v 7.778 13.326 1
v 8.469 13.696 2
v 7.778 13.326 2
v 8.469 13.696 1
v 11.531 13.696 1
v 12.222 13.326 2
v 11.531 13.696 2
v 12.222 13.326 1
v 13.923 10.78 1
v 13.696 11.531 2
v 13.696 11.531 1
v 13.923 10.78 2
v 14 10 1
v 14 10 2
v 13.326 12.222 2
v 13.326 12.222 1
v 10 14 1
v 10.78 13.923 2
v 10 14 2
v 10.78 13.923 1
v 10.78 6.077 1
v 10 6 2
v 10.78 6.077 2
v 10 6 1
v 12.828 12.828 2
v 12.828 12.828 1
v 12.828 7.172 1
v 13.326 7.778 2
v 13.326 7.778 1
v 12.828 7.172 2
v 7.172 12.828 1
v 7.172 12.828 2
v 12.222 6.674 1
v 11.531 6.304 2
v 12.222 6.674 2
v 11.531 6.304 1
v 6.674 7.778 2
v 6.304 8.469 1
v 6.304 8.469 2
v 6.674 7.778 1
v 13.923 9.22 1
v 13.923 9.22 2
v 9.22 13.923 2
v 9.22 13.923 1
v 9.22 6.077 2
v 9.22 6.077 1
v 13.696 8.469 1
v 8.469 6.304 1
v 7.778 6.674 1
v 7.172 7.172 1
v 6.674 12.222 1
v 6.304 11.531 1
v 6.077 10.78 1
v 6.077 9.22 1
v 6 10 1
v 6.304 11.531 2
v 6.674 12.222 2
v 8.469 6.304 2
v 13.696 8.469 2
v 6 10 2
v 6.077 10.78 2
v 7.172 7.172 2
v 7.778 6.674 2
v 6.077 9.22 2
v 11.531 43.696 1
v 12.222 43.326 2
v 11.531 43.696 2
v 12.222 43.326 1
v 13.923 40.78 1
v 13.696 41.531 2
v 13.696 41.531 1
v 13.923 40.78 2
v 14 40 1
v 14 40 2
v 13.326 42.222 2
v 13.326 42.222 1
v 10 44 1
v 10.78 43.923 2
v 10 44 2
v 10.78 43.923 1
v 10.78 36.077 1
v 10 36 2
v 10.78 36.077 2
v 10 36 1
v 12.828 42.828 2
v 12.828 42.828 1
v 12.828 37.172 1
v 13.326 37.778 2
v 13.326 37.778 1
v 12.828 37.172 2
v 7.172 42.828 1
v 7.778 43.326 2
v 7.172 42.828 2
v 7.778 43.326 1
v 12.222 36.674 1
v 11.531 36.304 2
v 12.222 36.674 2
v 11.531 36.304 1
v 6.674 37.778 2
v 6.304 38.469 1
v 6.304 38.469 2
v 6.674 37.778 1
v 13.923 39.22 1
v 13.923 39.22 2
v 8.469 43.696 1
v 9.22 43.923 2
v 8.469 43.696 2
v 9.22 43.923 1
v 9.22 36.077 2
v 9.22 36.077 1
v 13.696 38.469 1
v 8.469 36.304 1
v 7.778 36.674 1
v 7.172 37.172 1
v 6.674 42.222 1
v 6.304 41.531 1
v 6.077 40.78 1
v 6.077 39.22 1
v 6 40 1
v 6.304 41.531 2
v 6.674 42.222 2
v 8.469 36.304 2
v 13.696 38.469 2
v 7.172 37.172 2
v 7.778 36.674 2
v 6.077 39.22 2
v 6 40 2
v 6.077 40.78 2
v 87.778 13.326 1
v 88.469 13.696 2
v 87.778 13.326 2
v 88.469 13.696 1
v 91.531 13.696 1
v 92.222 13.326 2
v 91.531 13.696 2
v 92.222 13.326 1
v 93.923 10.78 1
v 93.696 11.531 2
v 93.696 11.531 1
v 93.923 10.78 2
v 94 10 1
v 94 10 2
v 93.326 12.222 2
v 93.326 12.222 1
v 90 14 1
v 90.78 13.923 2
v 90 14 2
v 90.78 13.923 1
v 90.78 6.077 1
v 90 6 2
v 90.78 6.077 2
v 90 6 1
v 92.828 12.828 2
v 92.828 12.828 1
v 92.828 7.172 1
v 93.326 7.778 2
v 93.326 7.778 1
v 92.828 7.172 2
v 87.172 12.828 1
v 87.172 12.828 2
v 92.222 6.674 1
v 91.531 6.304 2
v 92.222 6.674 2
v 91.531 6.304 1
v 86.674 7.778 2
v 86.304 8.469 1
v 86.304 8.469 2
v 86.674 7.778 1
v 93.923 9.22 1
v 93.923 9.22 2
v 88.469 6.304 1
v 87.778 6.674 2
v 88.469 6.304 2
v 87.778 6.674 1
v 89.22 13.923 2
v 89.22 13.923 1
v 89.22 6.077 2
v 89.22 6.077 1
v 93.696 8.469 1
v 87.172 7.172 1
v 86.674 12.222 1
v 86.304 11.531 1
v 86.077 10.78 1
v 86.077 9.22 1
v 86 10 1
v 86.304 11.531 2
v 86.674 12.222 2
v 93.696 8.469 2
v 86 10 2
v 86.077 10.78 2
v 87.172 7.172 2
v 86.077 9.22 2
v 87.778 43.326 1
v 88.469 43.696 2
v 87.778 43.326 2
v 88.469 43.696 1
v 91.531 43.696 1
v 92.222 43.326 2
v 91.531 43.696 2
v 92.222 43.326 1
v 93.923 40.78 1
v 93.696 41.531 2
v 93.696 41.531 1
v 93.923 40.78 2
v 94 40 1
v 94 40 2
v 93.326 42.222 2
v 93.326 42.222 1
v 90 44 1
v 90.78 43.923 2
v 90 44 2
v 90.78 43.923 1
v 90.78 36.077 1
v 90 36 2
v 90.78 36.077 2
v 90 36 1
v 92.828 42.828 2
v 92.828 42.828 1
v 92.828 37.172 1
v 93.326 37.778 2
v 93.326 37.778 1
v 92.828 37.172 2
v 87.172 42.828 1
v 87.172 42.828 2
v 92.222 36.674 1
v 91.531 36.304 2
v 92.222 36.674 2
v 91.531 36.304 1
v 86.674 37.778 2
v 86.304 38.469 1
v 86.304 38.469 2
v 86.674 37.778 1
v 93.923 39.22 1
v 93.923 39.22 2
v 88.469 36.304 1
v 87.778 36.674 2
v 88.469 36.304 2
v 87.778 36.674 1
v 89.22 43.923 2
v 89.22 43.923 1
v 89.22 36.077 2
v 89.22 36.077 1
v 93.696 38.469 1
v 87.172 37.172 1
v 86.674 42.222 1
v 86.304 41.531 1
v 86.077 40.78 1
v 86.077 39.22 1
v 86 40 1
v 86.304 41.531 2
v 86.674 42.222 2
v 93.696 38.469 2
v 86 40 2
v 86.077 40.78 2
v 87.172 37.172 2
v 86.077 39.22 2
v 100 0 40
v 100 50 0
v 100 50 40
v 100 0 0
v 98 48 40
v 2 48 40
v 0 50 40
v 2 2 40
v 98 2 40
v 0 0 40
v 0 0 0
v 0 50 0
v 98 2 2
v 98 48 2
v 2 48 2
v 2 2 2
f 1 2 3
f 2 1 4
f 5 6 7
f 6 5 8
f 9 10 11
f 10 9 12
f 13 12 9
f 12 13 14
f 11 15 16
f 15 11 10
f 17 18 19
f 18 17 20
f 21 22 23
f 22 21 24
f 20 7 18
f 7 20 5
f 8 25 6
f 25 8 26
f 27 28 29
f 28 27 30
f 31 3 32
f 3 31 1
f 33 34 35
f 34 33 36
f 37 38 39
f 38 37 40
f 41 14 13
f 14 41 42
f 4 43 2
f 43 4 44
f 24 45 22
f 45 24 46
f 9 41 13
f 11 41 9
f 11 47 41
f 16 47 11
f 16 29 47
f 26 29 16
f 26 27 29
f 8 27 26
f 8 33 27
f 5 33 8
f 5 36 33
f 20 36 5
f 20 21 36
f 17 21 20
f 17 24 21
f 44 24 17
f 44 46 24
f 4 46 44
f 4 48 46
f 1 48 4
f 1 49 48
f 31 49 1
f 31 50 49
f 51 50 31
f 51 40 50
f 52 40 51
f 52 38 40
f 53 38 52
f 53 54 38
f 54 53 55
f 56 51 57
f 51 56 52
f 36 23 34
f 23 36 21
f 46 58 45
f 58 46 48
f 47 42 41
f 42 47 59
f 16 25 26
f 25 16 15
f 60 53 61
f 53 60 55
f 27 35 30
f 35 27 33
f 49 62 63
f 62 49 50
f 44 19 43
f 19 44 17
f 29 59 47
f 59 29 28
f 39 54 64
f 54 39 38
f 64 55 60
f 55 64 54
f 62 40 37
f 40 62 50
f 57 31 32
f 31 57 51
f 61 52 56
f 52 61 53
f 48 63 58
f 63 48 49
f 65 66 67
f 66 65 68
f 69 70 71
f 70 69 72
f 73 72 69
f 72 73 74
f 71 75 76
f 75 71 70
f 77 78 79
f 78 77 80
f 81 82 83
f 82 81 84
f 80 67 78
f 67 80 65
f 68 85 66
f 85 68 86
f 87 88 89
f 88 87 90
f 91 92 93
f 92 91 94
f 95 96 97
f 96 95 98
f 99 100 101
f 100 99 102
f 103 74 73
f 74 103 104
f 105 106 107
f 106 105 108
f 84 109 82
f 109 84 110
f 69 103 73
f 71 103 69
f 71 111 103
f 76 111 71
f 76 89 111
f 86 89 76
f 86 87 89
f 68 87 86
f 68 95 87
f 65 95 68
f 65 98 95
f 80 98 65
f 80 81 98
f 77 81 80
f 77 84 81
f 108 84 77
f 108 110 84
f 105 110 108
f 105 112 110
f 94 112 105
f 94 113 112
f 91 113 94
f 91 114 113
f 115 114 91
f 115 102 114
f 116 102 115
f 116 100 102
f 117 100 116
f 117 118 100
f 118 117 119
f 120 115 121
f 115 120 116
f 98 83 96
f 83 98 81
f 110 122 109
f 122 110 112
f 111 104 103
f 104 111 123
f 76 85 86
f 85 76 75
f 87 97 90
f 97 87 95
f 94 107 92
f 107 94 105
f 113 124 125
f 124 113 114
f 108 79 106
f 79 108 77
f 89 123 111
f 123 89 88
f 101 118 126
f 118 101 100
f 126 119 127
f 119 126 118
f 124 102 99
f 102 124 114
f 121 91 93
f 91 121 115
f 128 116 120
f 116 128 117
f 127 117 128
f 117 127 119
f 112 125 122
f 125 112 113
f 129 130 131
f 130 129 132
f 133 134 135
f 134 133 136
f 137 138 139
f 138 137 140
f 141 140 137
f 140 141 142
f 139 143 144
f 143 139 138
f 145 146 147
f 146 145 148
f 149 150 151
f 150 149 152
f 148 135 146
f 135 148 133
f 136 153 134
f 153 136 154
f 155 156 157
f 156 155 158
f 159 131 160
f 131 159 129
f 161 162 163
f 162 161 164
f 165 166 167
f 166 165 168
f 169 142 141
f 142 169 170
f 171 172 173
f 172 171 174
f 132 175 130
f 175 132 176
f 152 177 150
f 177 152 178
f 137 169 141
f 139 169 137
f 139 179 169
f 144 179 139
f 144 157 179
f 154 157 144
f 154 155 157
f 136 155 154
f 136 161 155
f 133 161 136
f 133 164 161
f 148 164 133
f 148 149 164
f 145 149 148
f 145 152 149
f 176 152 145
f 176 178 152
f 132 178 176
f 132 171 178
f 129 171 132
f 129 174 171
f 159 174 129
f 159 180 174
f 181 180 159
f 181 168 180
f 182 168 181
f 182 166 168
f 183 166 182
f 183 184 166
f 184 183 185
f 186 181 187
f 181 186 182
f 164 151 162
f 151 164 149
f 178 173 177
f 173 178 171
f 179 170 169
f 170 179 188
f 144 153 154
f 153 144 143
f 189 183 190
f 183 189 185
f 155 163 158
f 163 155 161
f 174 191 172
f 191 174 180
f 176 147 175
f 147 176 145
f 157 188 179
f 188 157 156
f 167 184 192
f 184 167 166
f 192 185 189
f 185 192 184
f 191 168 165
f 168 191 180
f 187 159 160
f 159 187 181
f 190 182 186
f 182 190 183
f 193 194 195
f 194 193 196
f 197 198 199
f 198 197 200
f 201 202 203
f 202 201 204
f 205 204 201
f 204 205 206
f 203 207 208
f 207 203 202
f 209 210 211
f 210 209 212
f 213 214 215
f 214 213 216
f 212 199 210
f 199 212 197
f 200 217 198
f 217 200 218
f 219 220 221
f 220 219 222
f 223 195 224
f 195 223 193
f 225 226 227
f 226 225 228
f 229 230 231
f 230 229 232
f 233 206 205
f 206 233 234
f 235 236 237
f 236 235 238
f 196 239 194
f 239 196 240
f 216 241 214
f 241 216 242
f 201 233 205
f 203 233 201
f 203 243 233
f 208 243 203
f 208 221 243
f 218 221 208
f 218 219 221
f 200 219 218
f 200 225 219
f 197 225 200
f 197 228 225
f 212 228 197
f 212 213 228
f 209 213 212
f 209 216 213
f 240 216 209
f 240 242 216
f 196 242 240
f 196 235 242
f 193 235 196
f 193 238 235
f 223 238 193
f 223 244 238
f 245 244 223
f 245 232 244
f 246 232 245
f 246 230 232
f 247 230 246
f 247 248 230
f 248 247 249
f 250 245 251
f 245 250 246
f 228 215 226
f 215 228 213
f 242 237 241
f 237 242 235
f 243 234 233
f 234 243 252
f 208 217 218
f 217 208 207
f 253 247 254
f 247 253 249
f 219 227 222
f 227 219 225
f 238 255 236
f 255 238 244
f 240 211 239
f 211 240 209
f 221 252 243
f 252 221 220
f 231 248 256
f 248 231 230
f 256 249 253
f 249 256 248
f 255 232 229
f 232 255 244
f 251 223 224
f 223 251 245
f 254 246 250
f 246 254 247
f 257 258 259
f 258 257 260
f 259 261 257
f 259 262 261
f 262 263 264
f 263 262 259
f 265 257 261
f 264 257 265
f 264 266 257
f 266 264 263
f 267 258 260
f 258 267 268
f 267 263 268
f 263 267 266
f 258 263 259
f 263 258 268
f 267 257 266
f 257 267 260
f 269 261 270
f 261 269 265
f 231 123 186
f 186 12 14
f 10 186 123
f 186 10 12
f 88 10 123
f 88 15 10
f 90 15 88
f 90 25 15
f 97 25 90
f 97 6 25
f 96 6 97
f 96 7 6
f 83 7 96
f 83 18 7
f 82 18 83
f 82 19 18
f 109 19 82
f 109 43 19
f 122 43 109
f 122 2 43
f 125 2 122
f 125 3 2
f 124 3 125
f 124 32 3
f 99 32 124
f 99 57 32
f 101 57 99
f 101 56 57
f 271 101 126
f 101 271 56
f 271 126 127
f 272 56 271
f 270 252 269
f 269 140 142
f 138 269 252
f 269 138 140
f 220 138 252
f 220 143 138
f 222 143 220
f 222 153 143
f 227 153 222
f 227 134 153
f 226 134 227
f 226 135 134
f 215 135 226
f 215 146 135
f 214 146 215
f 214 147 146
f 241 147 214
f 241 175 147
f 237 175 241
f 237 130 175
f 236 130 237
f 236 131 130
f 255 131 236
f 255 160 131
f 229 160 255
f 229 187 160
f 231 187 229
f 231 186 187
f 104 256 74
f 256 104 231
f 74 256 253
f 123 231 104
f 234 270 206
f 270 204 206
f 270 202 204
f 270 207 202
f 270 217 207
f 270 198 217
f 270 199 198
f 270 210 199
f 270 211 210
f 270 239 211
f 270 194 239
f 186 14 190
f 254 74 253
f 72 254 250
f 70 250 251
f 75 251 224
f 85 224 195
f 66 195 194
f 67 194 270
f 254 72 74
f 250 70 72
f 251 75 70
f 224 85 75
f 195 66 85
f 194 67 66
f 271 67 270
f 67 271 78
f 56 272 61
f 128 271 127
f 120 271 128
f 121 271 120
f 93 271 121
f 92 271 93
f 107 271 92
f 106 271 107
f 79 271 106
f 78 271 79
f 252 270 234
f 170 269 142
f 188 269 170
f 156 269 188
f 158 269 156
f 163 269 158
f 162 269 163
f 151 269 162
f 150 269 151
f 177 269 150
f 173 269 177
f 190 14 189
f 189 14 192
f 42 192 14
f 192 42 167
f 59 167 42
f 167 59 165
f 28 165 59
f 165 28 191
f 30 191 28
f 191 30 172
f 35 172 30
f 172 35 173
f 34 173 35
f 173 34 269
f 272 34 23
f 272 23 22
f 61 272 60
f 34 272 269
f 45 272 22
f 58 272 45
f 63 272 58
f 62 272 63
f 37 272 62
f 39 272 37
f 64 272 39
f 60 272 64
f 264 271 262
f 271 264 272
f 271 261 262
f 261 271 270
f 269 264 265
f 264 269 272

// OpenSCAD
$fn = 32;

// ----------------------------------------------------------------------
// Enclosure box: bosses enclosure
// ----------------------------------------------------------------------

// --- parameters (mm) ---
box_l = 100;              // outer length, X
box_w = 50;               // outer width, Y
box_h = 40;               // outer height
wall_t = 2;               // wall thickness
boss_r = 4;               // corner boss radius
hole_r = 1.5;             // boss screw hole radius
boss_in = 10;             // boss inset from the corners

inner_h = box_h - wall_t;  // cavity depth
boss_h = inner_h - 2;  // corner boss height

difference() {
  cube([box_l, box_w, box_h]);
  translate([wall_t, wall_t, wall_t])
    cube([box_l - 2 * wall_t, box_w - 2 * wall_t, box_h]);
  for (sx = [0, 1], sy = [0, 1])
    translate([sx ? box_l - boss_in : boss_in,
               sy ? box_w - boss_in : boss_in, wall_t - 1]) {
      cylinder(r = boss_r, h = boss_h);
      translate([0, 0, boss_h - 4])
        cylinder(r = hole_r, h = 5);
    }
}
